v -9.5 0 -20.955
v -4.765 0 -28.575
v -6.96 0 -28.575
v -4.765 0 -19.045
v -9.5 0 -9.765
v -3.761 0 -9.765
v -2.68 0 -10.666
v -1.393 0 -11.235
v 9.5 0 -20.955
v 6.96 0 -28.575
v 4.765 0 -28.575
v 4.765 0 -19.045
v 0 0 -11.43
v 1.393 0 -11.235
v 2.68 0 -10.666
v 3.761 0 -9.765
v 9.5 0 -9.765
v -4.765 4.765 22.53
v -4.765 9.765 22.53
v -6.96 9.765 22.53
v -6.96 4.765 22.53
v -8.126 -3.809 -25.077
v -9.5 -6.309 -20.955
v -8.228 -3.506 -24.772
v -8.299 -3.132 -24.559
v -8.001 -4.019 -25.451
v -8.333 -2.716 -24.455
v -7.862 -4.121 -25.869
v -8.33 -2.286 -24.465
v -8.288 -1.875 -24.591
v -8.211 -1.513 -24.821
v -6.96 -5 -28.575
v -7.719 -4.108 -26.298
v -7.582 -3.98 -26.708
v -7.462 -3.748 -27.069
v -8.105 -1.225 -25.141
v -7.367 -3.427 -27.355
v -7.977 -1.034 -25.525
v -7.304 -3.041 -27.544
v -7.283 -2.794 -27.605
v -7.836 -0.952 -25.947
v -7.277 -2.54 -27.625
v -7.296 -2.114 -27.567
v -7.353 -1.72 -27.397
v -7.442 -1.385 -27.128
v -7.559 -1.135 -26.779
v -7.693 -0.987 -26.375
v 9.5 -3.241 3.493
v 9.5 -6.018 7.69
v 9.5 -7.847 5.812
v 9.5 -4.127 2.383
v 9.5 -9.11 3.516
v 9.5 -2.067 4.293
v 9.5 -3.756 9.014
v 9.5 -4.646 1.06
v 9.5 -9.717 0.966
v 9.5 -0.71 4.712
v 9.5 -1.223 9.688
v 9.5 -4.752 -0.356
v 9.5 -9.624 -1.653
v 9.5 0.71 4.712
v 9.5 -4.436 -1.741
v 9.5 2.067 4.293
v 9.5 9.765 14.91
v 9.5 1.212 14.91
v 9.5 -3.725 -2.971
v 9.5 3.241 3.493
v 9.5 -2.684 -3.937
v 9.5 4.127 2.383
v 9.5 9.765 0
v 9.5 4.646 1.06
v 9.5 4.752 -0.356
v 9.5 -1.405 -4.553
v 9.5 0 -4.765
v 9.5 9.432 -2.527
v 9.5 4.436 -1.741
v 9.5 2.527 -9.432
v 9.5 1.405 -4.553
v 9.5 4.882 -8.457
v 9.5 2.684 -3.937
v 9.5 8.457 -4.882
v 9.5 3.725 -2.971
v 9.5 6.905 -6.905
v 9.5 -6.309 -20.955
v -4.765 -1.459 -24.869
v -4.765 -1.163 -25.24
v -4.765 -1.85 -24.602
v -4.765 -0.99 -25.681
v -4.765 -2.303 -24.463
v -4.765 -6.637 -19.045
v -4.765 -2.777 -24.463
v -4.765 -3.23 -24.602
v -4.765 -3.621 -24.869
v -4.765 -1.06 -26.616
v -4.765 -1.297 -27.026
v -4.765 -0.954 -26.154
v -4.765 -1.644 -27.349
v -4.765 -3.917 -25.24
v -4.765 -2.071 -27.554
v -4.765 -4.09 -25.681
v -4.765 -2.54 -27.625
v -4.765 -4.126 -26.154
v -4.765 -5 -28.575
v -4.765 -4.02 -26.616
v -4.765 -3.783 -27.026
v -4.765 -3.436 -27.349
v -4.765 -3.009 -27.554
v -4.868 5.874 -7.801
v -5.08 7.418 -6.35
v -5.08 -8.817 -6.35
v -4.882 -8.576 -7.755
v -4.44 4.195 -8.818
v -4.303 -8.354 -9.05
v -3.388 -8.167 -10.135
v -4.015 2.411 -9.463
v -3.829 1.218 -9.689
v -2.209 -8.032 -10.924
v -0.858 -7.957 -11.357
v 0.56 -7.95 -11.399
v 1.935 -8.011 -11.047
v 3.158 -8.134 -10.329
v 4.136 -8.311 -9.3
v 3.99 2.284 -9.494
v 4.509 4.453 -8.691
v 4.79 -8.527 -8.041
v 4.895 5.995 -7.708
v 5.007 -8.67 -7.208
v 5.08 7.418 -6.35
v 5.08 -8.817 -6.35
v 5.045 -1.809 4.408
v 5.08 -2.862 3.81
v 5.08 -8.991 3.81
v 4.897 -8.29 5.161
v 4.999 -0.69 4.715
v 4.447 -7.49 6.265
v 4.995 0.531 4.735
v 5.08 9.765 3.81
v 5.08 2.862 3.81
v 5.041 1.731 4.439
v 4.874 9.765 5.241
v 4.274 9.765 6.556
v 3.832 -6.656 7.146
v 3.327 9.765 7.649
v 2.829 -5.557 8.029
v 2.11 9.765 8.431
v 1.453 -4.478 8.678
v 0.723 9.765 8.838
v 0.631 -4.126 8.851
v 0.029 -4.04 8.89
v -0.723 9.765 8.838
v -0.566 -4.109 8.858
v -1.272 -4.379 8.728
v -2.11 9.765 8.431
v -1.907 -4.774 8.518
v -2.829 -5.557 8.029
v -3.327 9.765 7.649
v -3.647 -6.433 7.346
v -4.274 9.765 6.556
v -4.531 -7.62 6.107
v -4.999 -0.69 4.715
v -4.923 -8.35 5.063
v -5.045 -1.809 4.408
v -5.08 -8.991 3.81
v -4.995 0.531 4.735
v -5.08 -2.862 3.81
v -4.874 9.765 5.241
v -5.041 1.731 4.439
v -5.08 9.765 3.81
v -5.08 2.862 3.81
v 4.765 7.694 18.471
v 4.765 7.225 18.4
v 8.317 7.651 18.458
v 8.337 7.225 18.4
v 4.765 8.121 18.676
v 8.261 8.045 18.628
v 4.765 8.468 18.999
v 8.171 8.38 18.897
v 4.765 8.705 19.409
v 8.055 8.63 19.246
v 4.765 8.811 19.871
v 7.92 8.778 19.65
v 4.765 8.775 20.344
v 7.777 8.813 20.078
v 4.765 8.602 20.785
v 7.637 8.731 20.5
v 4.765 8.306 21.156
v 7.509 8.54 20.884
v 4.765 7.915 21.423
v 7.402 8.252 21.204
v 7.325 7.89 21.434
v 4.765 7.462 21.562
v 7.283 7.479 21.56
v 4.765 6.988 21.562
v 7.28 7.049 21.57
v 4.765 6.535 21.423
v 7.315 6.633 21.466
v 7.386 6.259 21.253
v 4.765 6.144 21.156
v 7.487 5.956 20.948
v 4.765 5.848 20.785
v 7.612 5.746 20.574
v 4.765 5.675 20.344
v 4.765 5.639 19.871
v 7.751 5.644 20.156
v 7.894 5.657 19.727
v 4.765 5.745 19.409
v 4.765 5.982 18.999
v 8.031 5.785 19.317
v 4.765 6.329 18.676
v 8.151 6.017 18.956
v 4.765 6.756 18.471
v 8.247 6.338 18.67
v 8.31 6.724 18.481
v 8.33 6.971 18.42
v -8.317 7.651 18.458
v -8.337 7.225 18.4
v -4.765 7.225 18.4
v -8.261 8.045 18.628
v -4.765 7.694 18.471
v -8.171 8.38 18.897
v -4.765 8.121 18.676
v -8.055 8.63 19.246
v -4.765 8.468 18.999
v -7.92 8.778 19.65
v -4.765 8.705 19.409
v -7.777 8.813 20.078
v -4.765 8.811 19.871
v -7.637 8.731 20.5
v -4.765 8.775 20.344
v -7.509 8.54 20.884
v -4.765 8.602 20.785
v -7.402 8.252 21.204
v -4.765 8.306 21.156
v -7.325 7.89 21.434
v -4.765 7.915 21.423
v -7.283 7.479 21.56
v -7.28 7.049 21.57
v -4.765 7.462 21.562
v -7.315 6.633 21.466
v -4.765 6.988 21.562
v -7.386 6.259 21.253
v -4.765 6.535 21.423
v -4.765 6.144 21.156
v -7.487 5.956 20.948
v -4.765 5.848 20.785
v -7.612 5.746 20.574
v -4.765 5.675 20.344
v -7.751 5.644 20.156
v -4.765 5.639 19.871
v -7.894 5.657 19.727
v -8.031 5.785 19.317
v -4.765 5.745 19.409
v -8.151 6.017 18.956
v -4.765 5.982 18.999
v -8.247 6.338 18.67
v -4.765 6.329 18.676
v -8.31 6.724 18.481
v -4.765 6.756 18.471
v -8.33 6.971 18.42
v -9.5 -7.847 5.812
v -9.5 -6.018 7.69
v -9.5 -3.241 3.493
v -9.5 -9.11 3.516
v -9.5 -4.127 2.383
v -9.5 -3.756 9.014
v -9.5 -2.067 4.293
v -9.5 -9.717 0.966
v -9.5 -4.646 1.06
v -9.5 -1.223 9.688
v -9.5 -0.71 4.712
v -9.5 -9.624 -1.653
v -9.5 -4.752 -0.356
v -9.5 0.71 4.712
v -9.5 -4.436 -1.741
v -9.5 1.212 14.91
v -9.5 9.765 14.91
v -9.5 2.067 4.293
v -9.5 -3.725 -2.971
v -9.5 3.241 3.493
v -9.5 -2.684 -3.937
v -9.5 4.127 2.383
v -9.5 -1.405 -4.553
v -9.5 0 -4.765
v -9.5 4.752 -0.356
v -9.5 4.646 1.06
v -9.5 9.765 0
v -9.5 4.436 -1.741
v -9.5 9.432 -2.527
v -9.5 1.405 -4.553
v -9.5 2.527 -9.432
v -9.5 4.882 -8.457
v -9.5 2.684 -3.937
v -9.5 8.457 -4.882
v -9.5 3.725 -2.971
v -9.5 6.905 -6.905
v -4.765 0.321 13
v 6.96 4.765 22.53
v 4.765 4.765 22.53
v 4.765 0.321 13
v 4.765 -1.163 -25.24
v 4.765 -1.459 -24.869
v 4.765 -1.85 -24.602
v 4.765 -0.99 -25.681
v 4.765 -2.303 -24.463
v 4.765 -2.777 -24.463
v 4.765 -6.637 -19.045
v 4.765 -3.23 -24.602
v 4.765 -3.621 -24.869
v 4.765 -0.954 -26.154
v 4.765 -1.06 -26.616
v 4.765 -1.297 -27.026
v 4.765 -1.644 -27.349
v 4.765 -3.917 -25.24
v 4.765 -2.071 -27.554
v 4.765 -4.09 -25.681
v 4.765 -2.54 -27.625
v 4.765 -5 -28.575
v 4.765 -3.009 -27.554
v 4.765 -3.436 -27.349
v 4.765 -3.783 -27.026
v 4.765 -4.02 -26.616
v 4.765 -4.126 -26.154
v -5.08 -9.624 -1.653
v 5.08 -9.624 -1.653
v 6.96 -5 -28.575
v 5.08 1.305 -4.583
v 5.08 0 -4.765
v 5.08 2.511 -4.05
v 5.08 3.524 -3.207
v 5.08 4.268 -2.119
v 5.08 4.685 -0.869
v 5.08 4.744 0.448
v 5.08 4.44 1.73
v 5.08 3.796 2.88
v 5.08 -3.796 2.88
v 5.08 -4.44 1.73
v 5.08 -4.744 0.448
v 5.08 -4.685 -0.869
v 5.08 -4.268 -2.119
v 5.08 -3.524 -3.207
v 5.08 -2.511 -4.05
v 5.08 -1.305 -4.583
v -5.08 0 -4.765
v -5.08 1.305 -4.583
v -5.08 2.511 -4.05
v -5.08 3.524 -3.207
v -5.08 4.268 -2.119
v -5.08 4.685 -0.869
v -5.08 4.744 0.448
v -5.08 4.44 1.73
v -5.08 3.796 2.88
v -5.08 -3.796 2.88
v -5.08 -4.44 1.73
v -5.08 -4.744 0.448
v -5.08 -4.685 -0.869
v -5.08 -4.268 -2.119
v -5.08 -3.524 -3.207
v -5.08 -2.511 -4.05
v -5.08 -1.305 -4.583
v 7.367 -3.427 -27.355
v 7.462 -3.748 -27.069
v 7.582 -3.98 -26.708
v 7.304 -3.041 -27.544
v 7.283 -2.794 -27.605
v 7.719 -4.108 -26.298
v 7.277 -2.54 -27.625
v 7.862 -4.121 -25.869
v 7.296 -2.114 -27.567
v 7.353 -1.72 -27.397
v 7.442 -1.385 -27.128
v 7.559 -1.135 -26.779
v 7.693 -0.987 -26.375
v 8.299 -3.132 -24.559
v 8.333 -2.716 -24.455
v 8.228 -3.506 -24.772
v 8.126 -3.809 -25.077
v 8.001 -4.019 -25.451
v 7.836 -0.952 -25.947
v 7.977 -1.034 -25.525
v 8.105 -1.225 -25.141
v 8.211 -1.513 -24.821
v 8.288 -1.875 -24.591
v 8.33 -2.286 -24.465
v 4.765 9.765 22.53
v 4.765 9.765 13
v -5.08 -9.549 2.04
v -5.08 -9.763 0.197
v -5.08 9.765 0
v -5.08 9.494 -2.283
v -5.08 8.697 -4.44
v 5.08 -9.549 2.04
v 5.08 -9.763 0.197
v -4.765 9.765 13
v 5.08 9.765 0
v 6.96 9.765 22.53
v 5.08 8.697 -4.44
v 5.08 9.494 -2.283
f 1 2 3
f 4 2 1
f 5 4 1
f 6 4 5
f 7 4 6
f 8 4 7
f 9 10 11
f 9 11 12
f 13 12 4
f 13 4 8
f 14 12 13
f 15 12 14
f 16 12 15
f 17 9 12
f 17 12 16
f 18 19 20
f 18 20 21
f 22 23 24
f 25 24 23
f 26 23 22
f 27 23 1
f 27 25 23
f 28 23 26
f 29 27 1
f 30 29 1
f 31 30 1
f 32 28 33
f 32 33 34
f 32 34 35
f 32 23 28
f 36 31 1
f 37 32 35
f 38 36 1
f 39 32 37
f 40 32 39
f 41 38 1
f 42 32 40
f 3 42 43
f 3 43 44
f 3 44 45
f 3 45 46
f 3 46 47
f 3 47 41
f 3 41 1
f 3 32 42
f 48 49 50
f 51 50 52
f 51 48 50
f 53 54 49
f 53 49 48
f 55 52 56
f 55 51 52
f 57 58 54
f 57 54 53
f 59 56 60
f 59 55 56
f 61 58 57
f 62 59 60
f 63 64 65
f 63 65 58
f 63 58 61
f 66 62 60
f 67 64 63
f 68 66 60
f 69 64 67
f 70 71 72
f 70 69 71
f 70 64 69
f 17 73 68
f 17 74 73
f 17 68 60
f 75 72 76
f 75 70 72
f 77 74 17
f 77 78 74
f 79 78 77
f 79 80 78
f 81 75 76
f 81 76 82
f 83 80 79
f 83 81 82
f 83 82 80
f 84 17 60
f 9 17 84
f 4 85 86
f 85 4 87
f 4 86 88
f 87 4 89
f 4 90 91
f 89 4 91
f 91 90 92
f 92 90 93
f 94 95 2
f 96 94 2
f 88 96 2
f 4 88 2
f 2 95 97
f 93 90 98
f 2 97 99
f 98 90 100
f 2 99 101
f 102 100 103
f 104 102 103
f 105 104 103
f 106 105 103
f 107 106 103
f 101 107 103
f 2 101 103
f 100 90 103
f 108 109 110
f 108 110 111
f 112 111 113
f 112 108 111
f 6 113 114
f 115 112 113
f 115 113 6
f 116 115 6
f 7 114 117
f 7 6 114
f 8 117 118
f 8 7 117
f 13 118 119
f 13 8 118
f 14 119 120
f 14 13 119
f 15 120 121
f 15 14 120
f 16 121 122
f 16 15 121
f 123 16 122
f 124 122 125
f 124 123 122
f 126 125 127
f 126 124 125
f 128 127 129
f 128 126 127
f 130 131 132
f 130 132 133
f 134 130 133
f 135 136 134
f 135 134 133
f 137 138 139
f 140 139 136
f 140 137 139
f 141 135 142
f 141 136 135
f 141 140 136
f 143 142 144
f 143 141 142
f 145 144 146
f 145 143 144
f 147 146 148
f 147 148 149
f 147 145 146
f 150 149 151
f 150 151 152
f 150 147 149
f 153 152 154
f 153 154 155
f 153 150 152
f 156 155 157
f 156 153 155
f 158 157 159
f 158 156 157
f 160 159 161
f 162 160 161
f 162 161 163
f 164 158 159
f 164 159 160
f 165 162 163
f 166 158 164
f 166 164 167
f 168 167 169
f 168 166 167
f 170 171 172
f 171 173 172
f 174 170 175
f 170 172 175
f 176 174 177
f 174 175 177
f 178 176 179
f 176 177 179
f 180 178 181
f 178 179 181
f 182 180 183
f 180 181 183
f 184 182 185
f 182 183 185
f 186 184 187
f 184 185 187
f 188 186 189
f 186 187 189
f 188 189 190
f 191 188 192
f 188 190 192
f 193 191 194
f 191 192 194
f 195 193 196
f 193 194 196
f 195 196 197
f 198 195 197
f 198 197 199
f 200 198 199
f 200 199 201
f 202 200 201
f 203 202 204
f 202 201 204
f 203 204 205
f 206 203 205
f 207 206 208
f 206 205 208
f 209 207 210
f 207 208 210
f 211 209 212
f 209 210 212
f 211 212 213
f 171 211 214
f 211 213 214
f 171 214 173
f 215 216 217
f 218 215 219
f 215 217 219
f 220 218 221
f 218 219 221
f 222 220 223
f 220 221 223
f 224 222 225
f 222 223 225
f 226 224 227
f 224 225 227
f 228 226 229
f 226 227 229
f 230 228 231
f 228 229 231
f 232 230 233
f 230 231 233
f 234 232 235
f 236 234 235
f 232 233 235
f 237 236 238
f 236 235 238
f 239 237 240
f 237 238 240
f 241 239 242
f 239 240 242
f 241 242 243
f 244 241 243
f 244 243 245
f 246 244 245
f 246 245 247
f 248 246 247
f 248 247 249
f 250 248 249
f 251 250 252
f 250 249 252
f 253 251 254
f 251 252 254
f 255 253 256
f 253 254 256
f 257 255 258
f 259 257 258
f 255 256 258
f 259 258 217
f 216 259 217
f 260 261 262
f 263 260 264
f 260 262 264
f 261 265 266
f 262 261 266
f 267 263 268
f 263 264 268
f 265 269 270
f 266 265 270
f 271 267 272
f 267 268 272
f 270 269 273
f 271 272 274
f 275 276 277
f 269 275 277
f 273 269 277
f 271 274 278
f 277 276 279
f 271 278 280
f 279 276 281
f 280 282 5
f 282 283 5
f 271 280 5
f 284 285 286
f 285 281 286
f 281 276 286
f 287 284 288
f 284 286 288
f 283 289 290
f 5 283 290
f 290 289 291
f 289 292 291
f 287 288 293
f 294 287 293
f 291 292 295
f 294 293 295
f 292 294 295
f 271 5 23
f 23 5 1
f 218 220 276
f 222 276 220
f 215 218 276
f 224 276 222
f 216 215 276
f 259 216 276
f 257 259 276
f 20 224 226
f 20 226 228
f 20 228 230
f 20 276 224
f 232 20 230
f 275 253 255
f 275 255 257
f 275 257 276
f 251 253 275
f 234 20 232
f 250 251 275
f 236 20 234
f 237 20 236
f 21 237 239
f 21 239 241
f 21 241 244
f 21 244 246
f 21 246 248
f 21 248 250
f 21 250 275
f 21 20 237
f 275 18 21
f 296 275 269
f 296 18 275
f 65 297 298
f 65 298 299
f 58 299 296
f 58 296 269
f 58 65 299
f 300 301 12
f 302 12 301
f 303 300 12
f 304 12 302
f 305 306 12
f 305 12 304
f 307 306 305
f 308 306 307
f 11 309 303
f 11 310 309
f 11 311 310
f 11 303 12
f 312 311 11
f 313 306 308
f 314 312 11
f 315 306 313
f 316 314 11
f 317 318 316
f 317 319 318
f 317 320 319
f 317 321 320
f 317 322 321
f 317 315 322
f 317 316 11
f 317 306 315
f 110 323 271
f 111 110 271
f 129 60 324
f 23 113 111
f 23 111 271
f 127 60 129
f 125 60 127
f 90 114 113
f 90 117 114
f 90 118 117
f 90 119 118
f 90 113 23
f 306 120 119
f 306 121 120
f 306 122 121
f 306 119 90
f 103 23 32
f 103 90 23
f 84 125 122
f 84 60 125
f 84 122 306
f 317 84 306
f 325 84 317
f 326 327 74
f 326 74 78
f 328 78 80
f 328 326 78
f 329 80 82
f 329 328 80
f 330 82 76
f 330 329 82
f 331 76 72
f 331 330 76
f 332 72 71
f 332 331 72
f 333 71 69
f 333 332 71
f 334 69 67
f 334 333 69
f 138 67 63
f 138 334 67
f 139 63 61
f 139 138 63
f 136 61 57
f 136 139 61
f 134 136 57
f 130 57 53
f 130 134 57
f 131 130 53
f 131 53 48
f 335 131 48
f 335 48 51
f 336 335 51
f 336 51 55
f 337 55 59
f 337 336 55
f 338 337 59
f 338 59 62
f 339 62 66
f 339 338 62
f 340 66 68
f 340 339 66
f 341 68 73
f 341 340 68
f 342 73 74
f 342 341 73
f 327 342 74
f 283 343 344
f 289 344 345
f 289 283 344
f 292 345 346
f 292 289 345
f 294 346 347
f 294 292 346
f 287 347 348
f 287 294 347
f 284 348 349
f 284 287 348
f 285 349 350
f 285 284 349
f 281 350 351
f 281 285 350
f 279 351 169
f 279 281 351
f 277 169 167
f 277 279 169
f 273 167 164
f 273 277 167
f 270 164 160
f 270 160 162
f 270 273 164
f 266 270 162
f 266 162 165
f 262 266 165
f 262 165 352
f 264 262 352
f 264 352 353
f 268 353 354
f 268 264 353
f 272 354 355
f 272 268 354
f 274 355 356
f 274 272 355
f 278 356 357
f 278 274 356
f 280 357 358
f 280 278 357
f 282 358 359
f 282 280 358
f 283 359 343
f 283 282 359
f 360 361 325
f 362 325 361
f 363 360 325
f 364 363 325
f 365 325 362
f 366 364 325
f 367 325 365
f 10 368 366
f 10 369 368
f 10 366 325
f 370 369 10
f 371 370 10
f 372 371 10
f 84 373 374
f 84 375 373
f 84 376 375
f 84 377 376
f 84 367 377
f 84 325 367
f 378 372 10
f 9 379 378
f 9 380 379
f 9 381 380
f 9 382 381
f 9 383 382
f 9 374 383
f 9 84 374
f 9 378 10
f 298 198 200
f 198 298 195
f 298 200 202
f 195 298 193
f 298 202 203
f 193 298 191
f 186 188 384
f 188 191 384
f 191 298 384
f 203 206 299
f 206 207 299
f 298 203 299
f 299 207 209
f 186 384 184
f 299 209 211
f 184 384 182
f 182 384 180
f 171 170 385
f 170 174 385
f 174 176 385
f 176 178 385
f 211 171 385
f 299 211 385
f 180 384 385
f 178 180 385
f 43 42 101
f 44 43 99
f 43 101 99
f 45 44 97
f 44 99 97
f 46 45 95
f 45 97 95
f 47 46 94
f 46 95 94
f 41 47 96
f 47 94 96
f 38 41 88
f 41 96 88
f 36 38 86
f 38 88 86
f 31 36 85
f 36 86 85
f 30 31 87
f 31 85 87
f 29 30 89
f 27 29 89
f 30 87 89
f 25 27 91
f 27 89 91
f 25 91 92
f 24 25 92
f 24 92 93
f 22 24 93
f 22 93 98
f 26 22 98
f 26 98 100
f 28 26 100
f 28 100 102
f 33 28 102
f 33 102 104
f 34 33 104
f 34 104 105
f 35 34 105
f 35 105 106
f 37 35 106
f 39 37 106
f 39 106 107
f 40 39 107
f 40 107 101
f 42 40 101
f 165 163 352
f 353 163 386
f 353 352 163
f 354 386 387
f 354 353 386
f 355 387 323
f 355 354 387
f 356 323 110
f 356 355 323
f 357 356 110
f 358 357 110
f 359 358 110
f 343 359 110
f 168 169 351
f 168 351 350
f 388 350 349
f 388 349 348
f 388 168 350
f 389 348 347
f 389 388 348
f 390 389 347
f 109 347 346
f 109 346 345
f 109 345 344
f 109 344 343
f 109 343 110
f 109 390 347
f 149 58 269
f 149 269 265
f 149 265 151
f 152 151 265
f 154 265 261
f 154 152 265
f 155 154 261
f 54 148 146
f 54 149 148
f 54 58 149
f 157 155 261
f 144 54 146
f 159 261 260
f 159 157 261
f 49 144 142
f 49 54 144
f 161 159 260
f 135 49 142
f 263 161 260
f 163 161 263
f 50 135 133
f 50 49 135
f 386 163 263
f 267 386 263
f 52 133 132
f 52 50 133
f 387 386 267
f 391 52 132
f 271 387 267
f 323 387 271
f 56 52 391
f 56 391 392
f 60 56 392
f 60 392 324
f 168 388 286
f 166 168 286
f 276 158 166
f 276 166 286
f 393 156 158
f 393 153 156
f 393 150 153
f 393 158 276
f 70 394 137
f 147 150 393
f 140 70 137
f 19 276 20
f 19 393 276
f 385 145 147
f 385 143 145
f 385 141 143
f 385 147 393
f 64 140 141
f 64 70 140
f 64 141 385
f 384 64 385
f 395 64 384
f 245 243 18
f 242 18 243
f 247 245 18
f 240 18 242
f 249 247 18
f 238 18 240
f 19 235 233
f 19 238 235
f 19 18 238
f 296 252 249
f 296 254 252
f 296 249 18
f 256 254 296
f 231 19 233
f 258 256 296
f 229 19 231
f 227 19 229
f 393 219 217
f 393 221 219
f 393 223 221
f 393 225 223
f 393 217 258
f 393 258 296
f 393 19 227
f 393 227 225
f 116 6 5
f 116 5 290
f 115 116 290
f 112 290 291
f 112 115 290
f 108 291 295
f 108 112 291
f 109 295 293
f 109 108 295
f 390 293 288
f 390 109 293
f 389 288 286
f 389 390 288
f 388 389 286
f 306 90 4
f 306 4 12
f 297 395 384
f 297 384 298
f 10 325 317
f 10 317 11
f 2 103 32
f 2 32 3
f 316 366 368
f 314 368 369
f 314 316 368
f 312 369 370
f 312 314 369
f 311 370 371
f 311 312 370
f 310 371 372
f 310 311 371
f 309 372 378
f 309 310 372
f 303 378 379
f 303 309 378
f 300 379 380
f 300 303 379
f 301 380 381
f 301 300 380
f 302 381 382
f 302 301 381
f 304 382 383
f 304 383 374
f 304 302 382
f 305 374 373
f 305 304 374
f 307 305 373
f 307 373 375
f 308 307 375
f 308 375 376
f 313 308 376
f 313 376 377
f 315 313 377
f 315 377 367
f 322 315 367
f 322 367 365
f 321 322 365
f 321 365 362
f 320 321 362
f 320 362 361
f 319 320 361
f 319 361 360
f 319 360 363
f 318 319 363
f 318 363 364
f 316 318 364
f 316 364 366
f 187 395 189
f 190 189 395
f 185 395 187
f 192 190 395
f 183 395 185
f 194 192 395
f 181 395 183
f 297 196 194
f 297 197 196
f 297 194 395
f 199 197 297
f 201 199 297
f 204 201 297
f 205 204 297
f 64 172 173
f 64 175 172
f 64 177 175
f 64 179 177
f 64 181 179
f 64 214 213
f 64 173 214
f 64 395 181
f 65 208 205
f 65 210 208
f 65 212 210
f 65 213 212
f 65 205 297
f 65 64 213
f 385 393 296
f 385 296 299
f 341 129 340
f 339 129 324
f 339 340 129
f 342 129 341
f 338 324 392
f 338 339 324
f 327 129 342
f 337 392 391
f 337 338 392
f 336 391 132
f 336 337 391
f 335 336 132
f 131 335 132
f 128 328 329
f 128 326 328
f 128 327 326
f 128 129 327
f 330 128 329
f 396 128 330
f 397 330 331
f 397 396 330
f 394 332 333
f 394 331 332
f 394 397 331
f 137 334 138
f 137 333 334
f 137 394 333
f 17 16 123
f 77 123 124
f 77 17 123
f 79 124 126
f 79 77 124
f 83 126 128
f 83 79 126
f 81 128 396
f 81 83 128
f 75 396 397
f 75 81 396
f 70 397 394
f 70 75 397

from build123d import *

# Parameters (mm, degrees)
SKETCH1_R             = 4.765
BOSS_EXTRUDE1_DEPTH   = 9.5
CHAMFER1_SIZE         = 2.54
CHAMFER1_SIZE2        = 7.62
CHAMFER1_PART_2_SIZE  = 2.54
CHAMFER1_PART_2_SIZE2 = 7.62
CHAMFER2_SIZE         = 7.62
CHAMFER2_SIZE2        = 2.54
CUT_EXTRUDE1_DEPTH    = 17
SKETCH3_W             = 9.53
SKETCH3_H             = 9.53
CUT_EXTRUDE2_DEPTH    = 17
SKETCH4_R             = 1.59
CUT_EXTRUDE3_DEPTH    = 17


with BuildPart() as part:
    # Sketch1 → Boss-Extrude1 (new body, symmetric)
    with BuildSketch(Plane(origin=(0, 0, 0), x_dir=(0, 0, -1), z_dir=(1, 0, 0))):
        with BuildLine():
            Line((0, 9.765), (-22.53, 9.765))
            Line((-22.53, 9.765), (-22.53, 4.765))
            Line((-22.53, 4.765), (-9.688074689, -1.223288118))
            ThreePointArc((-9.688074689, -1.223288118), (-5.812387316, -7.84674319), (1.653013564, -9.624072483))
            Line((1.653013564, -9.624072483), (28.575, -5))
            Line((28.575, -5), (28.575, 0))
            Line((28.575, 0), (9.765, 0))
            ThreePointArc((9.765, 0), (6.904897718, 6.904897718), (0, 9.765))
        make_face()
        Circle(SKETCH1_R, mode=Mode.SUBTRACT)
    extrude(amount=BOSS_EXTRUDE1_DEPTH, both=True)

    # Chamfer1
    chamfer1_edges = [part.edges().sort_by_distance(p)[0] for p in [
        (9.5, 7.265, 22.53),
    ]]
    chamfer1_side = [part.faces().sort_by_distance(p)[0] for p in [
        (0, 7.265, 22.53),
    ]]
    chamfer(chamfer1_edges, length=CHAMFER1_SIZE, length2=CHAMFER1_SIZE2, reference=chamfer1_side[0])

    # Chamfer1 part 2
    chamfer1_part_2_edges = [part.edges().sort_by_distance(p)[0] for p in [
        (9.5, -2.5, -28.575),
    ]]
    chamfer1_part_2_side = [part.faces().sort_by_distance(p)[0] for p in [
        (0, -2.5, -28.575),
    ]]
    chamfer(chamfer1_part_2_edges, length=CHAMFER1_PART_2_SIZE, length2=CHAMFER1_PART_2_SIZE2, reference=chamfer1_part_2_side[0])

    # Chamfer2
    chamfer2_edges = [part.edges().sort_by_distance(p)[0] for p in [
        (-9.5, 7.265, 22.53),
        (-9.5, -2.5, -28.575),
    ]]
    chamfer2_side = [part.faces().sort_by_distance(p)[0] for p in [
        (-9.5, 9.217903854, 11.265),
    ]]
    chamfer(chamfer2_edges, length=CHAMFER2_SIZE, length2=CHAMFER2_SIZE2, reference=chamfer2_side[0])

    # Sketch2 → Cut-Extrude1 (cut, symmetric)
    with BuildSketch(Plane(origin=(0, 0, 0), x_dir=(1, 0, 0), z_dir=(0, 1, 0))):
        with BuildLine():
            Line((5.08, 6.35), (5.08, -3.81))
            ThreePointArc((5.08, -3.81), (0, -8.89), (-5.08, -3.81))
            Line((-5.08, -3.81), (-5.08, 6.35))
            ThreePointArc((-5.08, 6.35), (0, 11.43), (5.08, 6.35))
        make_face()
    extrude(amount=CUT_EXTRUDE1_DEPTH, both=True, mode=Mode.SUBTRACT)

    # Sketch3 → Cut-Extrude2 (cut, symmetric)
    with BuildSketch(Plane(origin=(0, 0, 0), x_dir=(1, 0, 0), z_dir=(0, 1, 0))):
        with Locations((0, 23.81)):
            Rectangle(SKETCH3_W, SKETCH3_H)
        with Locations((0, -17.765)):
            Rectangle(SKETCH3_W, SKETCH3_H)
    extrude(amount=CUT_EXTRUDE2_DEPTH, both=True, mode=Mode.SUBTRACT)

    # Sketch4 → Cut-Extrude3 (cut, symmetric)
    with BuildSketch(Plane(origin=(0, 0, 0), x_dir=(0, 0, -1), z_dir=(1, 0, 0))):
        with Locations((26.035, -2.54)):
            Circle(SKETCH4_R)
        with Locations((-19.99, 7.225)):
            Circle(SKETCH4_R)
    extrude(amount=CUT_EXTRUDE3_DEPTH, both=True, mode=Mode.SUBTRACT)


solid = part.part
